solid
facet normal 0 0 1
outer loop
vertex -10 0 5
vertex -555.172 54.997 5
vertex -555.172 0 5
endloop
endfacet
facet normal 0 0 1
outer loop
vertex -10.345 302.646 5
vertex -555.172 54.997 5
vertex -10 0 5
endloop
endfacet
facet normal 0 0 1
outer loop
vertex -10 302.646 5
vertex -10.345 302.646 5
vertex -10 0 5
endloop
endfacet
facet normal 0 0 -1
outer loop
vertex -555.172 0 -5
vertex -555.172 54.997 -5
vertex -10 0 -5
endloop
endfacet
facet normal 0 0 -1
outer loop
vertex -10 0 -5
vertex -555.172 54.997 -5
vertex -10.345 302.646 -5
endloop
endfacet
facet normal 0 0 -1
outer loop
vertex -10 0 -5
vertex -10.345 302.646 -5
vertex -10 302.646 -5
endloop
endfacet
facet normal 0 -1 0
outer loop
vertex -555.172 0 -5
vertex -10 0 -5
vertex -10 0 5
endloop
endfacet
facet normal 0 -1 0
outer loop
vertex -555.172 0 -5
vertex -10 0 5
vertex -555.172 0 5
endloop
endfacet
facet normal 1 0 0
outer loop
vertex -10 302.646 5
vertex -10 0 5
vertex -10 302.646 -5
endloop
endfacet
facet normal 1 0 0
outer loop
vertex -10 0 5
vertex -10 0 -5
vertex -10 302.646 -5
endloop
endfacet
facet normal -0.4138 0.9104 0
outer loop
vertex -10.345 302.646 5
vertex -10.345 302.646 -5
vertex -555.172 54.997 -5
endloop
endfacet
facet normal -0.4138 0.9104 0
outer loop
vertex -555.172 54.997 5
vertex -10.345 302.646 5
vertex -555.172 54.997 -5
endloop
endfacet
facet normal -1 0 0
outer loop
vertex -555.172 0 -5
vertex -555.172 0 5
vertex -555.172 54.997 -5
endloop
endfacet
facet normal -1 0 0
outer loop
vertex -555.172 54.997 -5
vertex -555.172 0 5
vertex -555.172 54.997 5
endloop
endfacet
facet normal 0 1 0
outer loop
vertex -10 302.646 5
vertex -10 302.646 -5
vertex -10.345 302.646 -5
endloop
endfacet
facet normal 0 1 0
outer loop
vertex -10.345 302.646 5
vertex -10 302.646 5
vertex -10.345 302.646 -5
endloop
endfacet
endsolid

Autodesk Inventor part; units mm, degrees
ref_plane "YZ Plane" through (0, 0, 0) normal (1, 0, 0) x (0, 1, 0)
ref_plane "XZ Plane" through (0, 0, 0) normal (0, 1, 0) x (-1, 0, 0)
ref_plane "Work Plane1" through (0, 0, 0) normal (0, 0, 1) x (1, 0, 0)
sketch "Sketch1" plane through (0, 0, 0) normal (0, 0, 1) x (1, 0, 0)
  line L0 (-560, 55) -> (-11.1724, 304.4671) construction
  line L1 (-10.3448, 302.6464) -> (-559.1724, 53.1793)
  line L2 (-559.1724, 53.1793) -> (-560, 55)
  line L3 (-10, 600) -> (0, 600) construction
  line L4 (0, 600) -> (0, 0) construction
  line L5 (0, 0) -> (-10, 0) construction
  line L6 (-10, 0) -> (-10, 600) construction
  line L7 (-10, 17.7053) -> (-559.1724, 17.7053)
  line L8 (-559.1724, 53.1793) -> (-559.1724, 17.7053)
  line L9 (-559.1724, 17.7053) -> (-10, 17.7053)
  line L10 (-10, 17.7053) -> (-10, 0)
  line L11 (-10, 0) -> (-559.1724, 0)
  line L12 (-559.1724, 0) -> (-559.1724, 17.7053)
  line L13 (-10, 302.6464) -> (-10.3448, 302.6464)
  line L14 (-10, 17.7053) -> (-10, 302.6464)
  point P0 (-10, 202.6464)
extrude "Extrusion5" add sketch "Sketch1" along normal mid plane 10
sketch "Sketch2" plane through (0, 0, 5) normal (0, 0, 1) x (1, 0, 0)
  line L0 (-559.1724, 53.1793) -> (-559.1724, 0) projected
  line L1 (-559.1724, 0) -> (-555.1724, 0)
  line L2 (-555.1724, 0) -> (-555.1724, 80)
  line L3 (-555.1724, 80) -> (-559.1724, 80)
  line L4 (-559.1724, 80) -> (-559.1724, 0)
  point P0 (0, 0)
  dimension "d10" = 4
  dimension "d11" = 80
extrude "Extrusion6" cut sketch "Sketch2" against normal through all
properties part number "verticalff1" material "Wood (Birch)"
